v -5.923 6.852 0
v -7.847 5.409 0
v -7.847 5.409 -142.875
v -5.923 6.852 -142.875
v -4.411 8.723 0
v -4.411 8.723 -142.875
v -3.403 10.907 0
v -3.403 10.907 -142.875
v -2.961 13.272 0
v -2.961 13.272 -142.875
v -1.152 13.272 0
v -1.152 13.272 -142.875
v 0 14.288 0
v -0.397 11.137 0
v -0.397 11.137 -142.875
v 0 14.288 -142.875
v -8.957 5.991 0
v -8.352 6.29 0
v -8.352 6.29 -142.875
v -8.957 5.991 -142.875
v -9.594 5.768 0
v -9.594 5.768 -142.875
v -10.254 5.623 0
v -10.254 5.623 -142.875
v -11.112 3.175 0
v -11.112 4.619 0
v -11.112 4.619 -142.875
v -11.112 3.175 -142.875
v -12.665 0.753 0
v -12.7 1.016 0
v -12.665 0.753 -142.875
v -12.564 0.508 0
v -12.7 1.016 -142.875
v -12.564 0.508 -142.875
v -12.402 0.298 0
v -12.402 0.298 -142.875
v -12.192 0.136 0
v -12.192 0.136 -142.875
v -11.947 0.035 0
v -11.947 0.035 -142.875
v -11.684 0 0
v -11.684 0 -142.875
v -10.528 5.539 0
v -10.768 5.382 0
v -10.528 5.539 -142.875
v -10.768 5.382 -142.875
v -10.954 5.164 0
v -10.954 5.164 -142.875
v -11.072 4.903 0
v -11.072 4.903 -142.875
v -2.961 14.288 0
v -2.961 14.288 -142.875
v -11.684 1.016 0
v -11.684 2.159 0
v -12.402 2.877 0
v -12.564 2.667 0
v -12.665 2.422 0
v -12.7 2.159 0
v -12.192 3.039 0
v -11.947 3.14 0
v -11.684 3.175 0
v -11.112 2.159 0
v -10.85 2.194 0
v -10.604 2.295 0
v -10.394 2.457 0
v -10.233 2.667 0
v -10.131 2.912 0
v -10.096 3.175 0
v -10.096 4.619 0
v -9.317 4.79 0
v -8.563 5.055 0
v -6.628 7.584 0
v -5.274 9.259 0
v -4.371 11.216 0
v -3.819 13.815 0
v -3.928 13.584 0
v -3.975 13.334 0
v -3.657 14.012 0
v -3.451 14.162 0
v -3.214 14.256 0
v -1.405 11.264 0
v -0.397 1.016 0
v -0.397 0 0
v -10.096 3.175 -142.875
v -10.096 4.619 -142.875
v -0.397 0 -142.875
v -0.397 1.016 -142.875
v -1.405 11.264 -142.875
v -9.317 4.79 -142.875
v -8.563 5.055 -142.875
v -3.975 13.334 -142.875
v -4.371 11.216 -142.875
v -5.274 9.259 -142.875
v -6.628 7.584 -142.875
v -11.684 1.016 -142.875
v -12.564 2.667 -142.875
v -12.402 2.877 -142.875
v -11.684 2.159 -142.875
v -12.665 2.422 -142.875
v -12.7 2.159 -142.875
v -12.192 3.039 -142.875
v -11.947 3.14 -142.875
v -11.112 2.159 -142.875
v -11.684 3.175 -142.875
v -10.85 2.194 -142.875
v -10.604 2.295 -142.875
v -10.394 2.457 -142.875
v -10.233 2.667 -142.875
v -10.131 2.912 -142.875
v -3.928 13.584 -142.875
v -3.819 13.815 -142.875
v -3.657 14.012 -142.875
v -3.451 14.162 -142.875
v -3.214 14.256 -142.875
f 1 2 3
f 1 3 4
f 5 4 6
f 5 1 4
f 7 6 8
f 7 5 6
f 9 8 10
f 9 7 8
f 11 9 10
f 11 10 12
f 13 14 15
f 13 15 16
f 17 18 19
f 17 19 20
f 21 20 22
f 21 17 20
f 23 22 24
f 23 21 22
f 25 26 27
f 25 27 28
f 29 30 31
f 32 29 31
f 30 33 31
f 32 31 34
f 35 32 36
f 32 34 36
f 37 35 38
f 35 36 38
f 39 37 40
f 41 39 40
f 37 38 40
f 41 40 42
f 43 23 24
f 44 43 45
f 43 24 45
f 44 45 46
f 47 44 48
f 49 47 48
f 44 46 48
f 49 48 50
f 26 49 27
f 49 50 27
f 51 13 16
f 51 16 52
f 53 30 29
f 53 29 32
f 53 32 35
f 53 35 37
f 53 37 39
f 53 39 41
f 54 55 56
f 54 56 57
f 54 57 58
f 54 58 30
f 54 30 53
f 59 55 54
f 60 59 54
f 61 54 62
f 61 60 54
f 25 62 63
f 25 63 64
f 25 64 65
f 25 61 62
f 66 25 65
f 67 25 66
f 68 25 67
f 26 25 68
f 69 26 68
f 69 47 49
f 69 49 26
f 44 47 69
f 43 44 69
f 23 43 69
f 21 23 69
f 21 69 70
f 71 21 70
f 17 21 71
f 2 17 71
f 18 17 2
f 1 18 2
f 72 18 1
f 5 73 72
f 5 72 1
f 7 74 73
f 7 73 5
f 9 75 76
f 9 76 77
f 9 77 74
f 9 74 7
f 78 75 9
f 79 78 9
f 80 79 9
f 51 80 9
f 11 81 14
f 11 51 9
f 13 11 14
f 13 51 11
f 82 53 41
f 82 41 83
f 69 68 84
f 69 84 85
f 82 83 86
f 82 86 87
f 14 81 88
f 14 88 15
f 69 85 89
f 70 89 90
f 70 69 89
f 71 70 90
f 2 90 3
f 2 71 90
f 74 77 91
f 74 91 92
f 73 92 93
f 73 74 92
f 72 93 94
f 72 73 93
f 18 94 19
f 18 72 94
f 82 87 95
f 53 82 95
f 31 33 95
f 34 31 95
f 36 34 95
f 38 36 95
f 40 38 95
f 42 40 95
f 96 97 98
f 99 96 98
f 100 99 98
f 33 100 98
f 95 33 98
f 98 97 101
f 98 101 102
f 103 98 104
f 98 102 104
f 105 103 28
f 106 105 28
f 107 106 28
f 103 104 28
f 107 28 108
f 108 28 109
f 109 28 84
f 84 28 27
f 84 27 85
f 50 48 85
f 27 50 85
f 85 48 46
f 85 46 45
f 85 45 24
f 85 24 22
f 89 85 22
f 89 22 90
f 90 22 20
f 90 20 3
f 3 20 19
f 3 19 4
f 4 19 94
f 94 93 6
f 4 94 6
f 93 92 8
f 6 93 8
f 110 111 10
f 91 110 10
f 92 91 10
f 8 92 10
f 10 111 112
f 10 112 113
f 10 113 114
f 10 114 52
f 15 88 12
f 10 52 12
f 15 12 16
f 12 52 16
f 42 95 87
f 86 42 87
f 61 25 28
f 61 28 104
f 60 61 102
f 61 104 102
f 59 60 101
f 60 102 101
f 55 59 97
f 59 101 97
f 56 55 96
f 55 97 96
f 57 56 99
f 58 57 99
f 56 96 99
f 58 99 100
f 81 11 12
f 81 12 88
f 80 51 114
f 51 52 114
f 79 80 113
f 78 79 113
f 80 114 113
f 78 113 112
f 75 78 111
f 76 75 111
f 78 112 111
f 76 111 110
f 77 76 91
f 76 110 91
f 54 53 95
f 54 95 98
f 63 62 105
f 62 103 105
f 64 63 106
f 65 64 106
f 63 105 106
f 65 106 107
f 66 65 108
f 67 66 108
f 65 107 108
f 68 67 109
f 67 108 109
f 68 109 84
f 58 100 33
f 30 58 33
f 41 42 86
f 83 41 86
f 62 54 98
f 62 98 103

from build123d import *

# Parameters (mm, degrees)
EXTRUDE_THIN1_DEPTH = 142.875
FILLET1_R           = 1.016


with BuildPart() as part:
    # Sketch1 → Extrude-Thin1 (new body)
    with BuildSketch(Plane.XY):
        with BuildLine():
            Line((-0.396875, 11.137402345), (0, 14.2875))
            Line((0, 14.2875), (-3.96875, 14.2875))
            ThreePointArc((-3.96875, 14.2875), (-5.03336677, 9.671261516), (-8.352026926, 6.290498085))
            ThreePointArc((-8.352026926, 6.290498085), (-9.684272791, 5.742948706), (-11.1125, 5.55625))
            Line((-11.1125, 5.55625), (-11.1125, 3.175))
            Line((-11.1125, 3.175), (-12.7, 3.175))
            Line((-12.7, 3.175), (-12.7, 0))
            Line((-12.7, 0), (-0.396875, 0))
            Line((-0.396875, 0), (-0.396875, 1.016))
            Line((-0.396875, 1.016), (-11.684, 1.016))
            Line((-11.684, 1.016), (-11.684, 2.159))
            Line((-11.684, 2.159), (-10.0965, 2.159))
            Line((-10.0965, 2.159), (-10.0965, 4.619256276))
            ThreePointArc((-10.0965, 4.619256276), (-8.935783532, 4.911179537), (-7.847254707, 5.408760591))
            ThreePointArc((-7.847254707, 5.408760591), (-4.411092734, 8.723027869), (-2.960927924, 13.2715))
            Line((-2.960927924, 13.2715), (-1.152035714, 13.2715))
            Line((-1.152035714, 13.2715), (-1.40490625, 11.264402345))
            Line((-1.40490625, 11.264402345), (-0.396875, 11.137402345))
        make_face()
    extrude(amount=-EXTRUDE_THIN1_DEPTH)

    # Fillet1
    fillet1_edges = [part.edges().sort_by_distance(p)[0] for p in [
        (-10.0965, 2.159, -71.4375),
        (-12.7, 0, -71.4375),
        (-12.7, 3.175, -71.4375),
        (-11.1125, 5.55625, -71.4375),
        (-3.96875, 14.2875, -71.4375),
    ]]
    fillet(fillet1_edges, radius=FILLET1_R)


solid = part.part
